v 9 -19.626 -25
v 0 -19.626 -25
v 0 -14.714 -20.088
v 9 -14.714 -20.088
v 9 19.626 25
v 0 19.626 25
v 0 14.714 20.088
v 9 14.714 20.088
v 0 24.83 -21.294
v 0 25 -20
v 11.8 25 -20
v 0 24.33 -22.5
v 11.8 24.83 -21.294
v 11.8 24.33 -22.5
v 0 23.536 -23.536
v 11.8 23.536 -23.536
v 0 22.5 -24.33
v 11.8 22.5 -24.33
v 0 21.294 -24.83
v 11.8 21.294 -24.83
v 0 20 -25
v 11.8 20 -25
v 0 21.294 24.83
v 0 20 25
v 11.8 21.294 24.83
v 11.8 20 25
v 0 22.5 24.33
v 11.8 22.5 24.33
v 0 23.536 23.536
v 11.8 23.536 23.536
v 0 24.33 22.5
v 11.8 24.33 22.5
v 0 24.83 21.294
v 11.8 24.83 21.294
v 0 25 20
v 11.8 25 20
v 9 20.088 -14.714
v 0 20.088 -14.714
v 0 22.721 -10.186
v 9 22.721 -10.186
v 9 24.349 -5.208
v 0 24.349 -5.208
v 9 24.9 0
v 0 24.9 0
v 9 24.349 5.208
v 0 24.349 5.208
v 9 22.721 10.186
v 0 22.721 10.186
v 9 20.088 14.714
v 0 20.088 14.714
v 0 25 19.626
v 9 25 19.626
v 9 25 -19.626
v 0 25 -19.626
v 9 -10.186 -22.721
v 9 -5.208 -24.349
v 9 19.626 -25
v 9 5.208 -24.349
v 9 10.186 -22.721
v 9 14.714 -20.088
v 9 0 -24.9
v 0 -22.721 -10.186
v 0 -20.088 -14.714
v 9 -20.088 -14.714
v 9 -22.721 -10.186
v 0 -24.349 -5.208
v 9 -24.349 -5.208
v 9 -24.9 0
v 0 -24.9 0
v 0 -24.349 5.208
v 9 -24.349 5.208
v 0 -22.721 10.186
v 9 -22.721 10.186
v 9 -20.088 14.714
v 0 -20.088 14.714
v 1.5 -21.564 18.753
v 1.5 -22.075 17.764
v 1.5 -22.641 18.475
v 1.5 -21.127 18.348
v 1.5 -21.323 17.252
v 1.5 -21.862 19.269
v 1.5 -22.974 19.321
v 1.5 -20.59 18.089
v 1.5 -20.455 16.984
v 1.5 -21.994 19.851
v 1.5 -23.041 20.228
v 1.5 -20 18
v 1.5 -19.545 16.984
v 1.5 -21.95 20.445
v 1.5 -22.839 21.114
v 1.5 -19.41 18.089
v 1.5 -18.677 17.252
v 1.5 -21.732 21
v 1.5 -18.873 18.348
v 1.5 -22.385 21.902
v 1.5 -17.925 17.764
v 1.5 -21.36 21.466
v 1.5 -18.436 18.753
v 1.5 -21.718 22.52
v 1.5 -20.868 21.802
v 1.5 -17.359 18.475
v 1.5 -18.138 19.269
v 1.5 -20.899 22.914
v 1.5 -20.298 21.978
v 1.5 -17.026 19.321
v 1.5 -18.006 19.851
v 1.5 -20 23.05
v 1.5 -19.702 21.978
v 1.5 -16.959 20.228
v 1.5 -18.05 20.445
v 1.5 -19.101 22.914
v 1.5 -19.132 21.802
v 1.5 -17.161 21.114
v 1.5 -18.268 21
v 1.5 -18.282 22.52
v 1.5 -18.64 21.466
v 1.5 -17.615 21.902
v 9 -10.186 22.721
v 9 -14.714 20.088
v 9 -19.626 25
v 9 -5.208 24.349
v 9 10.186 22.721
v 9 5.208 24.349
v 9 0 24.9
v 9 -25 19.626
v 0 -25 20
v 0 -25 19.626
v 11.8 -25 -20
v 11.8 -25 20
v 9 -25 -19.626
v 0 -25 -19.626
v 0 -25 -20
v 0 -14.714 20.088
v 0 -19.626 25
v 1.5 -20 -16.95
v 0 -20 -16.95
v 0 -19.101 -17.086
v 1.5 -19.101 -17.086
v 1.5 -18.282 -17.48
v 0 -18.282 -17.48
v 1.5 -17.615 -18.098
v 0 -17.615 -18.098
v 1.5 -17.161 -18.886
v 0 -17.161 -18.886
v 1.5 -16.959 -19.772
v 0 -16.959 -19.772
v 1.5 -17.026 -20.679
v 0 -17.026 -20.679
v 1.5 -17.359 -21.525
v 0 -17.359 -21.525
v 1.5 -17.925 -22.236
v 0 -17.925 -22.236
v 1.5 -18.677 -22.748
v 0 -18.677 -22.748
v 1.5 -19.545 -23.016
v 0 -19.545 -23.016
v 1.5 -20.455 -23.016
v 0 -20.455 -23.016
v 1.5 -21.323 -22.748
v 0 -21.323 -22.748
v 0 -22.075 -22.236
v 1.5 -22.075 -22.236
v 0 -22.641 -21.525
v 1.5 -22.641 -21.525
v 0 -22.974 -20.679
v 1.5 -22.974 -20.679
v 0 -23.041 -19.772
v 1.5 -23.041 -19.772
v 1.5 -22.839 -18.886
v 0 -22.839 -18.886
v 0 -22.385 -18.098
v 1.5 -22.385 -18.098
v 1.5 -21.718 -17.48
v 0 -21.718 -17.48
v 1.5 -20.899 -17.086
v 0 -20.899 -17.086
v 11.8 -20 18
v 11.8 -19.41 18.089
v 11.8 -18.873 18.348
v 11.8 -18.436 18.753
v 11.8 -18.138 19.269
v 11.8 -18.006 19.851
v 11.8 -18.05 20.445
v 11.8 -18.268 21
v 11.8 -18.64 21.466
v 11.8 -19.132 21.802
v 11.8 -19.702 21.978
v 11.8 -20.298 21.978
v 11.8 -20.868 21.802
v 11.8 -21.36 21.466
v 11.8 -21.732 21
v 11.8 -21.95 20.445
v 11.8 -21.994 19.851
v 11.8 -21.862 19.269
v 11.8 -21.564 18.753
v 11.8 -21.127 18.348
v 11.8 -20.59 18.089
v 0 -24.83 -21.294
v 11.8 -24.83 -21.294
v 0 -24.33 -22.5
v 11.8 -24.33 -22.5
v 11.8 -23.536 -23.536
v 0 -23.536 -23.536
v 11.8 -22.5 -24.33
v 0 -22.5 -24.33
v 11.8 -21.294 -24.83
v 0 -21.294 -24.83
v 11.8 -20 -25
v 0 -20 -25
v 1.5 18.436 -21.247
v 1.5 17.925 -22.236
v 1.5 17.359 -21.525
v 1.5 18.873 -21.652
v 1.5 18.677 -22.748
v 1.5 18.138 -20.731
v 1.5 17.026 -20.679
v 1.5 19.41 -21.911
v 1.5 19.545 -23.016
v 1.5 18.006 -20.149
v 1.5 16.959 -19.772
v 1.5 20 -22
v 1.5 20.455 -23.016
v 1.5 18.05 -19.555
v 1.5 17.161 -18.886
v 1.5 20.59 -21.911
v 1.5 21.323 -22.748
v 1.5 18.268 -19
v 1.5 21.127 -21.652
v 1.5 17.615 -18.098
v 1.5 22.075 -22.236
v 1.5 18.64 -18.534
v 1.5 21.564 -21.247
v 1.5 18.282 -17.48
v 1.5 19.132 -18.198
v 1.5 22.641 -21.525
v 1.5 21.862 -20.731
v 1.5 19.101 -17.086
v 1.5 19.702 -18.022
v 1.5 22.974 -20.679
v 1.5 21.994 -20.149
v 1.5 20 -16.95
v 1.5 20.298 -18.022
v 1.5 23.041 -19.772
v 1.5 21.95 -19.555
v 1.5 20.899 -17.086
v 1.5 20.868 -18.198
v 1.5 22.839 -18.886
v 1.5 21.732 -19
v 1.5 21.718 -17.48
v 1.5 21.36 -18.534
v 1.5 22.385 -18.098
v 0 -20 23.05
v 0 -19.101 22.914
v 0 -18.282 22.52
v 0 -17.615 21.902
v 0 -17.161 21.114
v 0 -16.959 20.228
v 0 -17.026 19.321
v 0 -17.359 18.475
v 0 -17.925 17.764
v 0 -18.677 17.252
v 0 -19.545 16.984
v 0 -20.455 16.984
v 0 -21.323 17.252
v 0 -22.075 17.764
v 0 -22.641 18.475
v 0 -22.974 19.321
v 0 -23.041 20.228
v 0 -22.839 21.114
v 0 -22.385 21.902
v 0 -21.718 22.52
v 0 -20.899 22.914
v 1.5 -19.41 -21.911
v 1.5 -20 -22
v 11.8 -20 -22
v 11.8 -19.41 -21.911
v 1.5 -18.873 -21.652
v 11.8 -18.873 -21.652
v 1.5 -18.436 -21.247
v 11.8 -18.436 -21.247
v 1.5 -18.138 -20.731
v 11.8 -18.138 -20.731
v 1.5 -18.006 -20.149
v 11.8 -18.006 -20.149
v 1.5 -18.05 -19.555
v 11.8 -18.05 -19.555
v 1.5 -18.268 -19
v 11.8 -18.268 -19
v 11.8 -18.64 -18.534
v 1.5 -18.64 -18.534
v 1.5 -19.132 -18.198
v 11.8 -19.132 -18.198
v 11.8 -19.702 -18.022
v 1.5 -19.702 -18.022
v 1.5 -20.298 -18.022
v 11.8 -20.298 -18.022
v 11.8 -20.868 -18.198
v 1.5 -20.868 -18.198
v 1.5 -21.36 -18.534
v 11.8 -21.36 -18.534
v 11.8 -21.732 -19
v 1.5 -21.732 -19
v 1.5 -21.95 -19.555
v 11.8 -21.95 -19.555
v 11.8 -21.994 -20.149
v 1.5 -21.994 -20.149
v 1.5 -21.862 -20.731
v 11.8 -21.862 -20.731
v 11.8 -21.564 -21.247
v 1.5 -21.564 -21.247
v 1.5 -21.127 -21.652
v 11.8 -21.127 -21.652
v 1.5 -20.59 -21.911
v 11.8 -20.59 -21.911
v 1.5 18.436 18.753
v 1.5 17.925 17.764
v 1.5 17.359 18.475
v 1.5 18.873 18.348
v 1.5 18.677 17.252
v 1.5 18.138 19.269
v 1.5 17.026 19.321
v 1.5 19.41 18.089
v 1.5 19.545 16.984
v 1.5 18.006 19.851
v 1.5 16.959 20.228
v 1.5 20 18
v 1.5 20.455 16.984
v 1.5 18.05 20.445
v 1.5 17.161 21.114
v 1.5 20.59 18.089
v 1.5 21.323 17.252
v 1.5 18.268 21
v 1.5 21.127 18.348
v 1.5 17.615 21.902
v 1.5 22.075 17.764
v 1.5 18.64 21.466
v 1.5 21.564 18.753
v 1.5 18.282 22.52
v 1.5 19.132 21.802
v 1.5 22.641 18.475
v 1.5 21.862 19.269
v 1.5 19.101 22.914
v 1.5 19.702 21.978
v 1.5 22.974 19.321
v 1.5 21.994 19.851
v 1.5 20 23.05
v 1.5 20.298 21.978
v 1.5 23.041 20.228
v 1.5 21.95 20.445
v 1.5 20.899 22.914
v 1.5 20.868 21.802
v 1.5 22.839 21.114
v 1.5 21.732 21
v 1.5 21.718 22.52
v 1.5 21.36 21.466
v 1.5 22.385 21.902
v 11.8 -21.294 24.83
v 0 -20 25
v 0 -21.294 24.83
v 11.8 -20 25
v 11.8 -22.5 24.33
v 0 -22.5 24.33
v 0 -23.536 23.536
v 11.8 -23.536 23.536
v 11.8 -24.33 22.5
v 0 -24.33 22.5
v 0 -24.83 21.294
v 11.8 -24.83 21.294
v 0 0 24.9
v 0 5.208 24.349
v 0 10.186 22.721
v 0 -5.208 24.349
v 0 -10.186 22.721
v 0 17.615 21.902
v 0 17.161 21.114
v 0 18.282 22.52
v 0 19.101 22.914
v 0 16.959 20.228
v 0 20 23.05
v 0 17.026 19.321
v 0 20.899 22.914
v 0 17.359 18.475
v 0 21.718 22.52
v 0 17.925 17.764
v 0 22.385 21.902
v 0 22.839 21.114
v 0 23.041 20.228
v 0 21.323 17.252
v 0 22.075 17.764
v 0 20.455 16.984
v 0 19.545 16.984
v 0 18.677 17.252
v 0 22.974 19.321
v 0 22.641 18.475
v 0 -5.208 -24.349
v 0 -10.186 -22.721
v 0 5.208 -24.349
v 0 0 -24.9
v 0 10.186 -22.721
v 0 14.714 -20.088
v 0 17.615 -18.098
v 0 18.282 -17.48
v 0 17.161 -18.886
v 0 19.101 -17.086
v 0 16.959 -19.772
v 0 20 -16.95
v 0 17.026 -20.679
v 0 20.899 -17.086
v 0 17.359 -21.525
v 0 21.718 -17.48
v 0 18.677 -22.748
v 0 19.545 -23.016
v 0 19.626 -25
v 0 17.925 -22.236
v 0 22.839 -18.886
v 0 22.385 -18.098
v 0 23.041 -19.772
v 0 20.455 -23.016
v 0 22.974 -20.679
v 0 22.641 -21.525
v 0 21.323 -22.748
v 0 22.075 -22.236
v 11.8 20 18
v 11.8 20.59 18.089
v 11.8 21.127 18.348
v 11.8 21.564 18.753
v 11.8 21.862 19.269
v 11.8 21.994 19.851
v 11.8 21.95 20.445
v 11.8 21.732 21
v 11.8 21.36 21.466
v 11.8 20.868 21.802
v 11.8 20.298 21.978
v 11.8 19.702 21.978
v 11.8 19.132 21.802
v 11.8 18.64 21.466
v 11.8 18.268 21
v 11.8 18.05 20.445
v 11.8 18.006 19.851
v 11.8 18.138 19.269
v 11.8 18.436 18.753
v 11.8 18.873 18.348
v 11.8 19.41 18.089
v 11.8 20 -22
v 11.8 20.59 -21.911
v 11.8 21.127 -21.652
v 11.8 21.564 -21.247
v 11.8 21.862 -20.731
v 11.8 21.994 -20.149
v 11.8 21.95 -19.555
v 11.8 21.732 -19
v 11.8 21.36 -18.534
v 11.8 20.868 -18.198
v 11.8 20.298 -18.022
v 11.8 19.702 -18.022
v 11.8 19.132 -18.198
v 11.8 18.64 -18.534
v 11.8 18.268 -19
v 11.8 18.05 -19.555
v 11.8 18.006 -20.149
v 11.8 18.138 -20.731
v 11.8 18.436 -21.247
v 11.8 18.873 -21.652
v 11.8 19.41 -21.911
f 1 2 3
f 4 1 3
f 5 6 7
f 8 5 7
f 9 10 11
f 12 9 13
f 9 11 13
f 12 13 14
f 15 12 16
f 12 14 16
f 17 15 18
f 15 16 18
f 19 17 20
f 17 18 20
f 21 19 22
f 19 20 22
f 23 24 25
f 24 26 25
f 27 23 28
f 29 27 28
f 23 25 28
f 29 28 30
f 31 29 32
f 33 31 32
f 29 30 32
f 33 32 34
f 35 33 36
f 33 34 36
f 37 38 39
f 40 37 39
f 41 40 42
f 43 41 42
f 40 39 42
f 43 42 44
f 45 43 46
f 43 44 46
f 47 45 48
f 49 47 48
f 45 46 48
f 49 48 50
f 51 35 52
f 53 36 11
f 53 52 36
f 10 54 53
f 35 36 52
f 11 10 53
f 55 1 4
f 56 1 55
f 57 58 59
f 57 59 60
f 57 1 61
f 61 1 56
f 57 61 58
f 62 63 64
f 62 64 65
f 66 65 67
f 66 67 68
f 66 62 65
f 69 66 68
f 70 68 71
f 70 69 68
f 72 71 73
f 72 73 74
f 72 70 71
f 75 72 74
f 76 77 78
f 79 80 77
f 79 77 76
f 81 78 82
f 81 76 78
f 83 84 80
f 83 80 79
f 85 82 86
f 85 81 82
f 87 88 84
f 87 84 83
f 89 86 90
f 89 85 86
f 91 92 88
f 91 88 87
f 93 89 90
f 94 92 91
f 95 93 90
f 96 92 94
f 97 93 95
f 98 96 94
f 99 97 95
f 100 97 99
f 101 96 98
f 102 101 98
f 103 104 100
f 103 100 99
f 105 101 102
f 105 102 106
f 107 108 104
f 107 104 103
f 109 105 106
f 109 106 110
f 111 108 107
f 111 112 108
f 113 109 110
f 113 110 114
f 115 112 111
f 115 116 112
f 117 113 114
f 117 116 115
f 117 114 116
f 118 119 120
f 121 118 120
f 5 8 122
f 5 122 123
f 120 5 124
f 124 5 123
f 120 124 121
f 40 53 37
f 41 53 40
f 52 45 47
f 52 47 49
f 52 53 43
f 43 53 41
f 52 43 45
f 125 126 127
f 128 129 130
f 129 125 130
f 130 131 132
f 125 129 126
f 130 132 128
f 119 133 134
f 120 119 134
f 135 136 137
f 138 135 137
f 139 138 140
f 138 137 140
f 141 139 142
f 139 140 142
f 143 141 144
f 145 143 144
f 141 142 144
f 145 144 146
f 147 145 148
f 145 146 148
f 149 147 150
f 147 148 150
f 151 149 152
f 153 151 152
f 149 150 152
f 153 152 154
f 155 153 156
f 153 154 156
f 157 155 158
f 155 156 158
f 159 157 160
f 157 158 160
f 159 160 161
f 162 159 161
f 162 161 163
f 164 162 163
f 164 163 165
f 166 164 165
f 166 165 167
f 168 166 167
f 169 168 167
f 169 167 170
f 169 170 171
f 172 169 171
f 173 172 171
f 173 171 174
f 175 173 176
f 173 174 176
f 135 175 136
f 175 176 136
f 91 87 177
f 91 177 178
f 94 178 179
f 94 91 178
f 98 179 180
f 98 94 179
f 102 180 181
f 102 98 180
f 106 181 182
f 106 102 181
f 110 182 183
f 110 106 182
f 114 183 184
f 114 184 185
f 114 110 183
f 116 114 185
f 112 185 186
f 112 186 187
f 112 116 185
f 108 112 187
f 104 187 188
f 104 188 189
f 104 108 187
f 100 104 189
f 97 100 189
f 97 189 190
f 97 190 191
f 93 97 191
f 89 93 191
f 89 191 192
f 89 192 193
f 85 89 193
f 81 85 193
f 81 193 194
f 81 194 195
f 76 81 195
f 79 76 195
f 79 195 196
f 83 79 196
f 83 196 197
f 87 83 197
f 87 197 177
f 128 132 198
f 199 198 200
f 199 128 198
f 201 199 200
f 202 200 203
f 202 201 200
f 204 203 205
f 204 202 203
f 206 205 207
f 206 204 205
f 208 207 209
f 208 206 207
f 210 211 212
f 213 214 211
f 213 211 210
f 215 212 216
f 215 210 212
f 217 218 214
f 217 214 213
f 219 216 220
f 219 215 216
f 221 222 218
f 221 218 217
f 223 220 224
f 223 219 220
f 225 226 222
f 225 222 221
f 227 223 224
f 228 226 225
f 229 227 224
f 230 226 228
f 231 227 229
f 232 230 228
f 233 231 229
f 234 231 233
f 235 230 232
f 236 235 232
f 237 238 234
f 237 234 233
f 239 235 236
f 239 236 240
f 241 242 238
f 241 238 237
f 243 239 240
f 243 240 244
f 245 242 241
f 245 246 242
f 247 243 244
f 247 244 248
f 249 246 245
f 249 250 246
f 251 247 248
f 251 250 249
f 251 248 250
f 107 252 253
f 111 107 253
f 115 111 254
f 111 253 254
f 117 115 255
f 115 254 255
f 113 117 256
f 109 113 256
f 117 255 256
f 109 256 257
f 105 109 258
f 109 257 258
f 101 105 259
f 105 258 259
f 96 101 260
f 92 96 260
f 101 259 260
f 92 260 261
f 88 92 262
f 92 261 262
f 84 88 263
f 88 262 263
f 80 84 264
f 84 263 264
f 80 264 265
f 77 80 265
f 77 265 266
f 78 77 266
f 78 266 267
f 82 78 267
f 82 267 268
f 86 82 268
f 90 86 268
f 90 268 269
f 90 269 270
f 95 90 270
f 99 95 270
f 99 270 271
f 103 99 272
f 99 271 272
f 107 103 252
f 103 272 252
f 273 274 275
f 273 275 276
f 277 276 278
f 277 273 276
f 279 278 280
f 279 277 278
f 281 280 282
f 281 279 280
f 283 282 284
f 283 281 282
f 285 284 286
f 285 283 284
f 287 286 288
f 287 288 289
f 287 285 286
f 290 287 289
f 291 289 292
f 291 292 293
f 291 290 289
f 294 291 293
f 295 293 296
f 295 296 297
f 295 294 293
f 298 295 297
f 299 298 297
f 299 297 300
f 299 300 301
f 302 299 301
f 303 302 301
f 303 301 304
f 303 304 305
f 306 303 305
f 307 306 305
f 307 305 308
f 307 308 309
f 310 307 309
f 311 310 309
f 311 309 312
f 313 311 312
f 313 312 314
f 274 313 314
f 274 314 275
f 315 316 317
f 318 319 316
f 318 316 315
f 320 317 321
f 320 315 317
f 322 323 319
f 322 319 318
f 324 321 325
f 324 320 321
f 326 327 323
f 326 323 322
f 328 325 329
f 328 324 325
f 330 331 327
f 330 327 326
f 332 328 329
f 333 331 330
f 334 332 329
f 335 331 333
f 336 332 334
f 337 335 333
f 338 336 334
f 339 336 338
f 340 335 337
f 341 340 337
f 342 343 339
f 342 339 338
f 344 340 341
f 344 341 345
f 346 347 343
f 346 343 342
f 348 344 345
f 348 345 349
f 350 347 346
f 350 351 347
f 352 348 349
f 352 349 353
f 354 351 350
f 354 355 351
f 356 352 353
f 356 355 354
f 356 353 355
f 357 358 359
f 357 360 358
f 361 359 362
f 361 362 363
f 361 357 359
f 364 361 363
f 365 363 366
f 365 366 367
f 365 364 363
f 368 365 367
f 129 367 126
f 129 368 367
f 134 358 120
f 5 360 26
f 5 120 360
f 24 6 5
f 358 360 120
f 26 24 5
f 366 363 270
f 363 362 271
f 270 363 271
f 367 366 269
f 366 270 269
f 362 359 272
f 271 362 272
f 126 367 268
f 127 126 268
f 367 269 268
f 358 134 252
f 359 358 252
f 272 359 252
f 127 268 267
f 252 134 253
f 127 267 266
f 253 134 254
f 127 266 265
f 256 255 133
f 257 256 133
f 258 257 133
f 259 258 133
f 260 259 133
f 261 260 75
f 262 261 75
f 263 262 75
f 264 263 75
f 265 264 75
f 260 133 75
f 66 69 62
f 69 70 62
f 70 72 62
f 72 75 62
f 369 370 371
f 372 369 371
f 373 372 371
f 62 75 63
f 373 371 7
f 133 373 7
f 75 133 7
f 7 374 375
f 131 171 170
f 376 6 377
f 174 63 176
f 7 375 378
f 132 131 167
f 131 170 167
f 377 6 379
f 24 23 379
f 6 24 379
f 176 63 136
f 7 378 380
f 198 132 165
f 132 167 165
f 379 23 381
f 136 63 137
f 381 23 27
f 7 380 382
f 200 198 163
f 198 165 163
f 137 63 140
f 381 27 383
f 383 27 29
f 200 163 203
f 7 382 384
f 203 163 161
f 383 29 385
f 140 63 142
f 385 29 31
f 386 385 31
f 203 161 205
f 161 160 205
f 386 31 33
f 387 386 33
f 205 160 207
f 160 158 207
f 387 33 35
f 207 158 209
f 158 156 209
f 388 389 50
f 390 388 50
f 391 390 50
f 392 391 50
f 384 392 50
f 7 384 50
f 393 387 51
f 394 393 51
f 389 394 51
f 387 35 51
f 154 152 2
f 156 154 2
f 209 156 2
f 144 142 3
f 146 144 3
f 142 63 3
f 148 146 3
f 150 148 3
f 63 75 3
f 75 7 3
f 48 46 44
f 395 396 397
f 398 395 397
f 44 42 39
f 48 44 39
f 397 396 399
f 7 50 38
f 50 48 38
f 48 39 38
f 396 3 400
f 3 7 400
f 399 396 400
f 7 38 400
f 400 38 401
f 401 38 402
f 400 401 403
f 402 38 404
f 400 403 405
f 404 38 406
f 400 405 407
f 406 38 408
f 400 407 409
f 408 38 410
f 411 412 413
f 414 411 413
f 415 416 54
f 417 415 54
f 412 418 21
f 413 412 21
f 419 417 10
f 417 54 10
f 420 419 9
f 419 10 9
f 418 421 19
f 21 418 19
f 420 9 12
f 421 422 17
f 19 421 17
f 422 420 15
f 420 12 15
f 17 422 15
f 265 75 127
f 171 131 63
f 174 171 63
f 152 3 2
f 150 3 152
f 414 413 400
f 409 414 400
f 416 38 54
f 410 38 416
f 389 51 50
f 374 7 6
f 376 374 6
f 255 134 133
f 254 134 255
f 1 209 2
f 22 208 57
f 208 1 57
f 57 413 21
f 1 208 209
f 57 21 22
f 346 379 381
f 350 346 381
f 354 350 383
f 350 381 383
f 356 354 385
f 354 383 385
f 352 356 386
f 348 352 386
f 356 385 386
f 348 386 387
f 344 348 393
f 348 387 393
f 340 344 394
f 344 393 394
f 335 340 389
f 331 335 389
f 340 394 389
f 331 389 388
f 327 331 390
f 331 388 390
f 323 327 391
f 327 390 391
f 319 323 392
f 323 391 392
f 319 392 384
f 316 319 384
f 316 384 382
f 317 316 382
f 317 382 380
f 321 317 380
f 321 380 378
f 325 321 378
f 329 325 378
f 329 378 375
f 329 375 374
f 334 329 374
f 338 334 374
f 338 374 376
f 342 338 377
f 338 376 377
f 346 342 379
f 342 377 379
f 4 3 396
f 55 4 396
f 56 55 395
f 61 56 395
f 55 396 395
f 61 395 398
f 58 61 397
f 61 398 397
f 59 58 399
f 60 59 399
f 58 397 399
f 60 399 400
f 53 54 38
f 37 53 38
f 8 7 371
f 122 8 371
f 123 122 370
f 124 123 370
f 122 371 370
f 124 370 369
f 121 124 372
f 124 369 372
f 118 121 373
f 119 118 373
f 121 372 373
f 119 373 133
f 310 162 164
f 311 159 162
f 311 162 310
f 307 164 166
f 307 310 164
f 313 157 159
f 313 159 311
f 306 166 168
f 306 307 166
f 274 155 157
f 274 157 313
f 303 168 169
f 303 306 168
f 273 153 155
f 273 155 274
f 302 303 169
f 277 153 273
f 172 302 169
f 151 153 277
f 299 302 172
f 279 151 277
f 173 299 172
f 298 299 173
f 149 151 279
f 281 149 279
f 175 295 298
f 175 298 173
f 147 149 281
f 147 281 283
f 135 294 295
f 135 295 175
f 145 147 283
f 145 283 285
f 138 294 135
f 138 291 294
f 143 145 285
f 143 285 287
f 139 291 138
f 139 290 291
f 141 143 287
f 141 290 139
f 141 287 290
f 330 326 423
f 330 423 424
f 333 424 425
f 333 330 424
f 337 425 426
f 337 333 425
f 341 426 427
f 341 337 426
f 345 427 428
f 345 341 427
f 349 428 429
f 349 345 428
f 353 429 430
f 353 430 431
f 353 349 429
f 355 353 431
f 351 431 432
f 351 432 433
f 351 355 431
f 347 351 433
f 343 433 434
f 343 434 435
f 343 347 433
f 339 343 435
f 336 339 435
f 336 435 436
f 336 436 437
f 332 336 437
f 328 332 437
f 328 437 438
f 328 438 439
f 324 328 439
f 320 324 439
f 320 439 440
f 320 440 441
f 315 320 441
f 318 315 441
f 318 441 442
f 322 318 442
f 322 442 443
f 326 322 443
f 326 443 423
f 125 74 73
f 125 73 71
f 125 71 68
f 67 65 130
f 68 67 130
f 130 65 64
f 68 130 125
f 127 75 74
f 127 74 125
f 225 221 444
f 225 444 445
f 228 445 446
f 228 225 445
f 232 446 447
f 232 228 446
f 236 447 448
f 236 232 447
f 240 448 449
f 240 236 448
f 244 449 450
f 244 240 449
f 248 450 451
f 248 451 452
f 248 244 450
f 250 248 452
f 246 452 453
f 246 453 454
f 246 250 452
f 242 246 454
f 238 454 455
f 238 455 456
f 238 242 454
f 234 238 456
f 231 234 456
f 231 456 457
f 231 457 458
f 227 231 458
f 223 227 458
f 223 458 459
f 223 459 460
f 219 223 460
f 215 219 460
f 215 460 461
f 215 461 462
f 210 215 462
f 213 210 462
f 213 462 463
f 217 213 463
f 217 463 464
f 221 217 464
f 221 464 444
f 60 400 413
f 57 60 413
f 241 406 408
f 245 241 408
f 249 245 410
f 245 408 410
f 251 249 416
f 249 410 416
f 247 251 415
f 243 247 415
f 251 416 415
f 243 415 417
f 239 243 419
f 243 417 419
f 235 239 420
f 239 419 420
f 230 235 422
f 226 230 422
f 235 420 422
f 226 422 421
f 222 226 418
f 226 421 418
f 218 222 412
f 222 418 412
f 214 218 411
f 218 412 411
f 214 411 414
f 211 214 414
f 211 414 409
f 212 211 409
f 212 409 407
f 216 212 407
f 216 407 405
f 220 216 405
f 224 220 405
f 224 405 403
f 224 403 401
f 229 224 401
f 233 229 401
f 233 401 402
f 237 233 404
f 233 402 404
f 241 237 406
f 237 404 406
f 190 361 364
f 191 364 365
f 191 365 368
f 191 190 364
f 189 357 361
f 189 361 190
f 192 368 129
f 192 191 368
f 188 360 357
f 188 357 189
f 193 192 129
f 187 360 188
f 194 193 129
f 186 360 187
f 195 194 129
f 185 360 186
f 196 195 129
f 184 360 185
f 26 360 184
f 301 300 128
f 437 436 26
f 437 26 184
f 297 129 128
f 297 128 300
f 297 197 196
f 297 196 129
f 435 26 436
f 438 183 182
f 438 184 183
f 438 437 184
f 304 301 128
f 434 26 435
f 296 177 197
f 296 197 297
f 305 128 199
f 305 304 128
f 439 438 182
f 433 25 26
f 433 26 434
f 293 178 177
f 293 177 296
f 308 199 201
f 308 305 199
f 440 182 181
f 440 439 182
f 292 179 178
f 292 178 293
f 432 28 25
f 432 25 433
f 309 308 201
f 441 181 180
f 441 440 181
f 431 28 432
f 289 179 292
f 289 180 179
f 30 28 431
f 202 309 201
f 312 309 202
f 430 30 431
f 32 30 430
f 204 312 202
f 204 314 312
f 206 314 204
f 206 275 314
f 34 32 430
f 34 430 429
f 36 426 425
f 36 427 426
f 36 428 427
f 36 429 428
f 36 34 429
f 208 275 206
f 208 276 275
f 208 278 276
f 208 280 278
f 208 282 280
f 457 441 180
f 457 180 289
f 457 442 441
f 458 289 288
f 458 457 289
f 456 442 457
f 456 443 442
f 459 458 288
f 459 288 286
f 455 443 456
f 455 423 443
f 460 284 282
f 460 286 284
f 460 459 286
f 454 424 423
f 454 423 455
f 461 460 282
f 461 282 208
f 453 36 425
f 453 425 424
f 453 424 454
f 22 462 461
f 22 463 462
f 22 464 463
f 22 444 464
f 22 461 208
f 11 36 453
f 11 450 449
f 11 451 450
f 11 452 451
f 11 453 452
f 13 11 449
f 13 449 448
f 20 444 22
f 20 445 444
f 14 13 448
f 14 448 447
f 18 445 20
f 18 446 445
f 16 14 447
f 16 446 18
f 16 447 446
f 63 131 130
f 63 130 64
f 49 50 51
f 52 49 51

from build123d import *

# Parameters (mm, degrees)
SKETCH1_W          = 50
SKETCH1_H          = 50
SKETCH1_R          = 2
BODY_DEPTH         = 11.8
FILLET1_R          = 5
SKETCH2_R          = 3.05
C_BORES_DEPTH      = 1.5
CUT_EXTRUDE1_DEPTH = 9


with BuildPart() as part:
    # Sketch1 → Body (new body)
    with BuildSketch(Plane(origin=(0, 0, 0), x_dir=(0, 0, -1), z_dir=(1, 0, 0))):
        Rectangle(SKETCH1_W, SKETCH1_H)
        with Locations((-20, -20)):
            Circle(SKETCH1_R, mode=Mode.SUBTRACT)
        with Locations((-20, 20)):
            Circle(SKETCH1_R, mode=Mode.SUBTRACT)
        with Locations((20, 20)):
            Circle(SKETCH1_R, mode=Mode.SUBTRACT)
        with Locations((20, -20)):
            Circle(SKETCH1_R, mode=Mode.SUBTRACT)
    extrude(amount=BODY_DEPTH)

    # Fillet1
    fillet1_edges = [part.edges().sort_by_distance(p)[0] for p in [
        (5.9, -25, -25),
        (5.9, -25, 25),
        (5.9, 25, 25),
        (5.9, 25, -25),
    ]]
    fillet(fillet1_edges, radius=FILLET1_R)

    # Sketch2 → C'Bores (cut)
    with BuildSketch(Plane.ZY):
        with Locations((-20, -20)):
            Circle(SKETCH2_R)
        with Locations((-20, 20)):
            Circle(SKETCH2_R)
        with Locations((20, 20)):
            Circle(SKETCH2_R)
        with Locations((20, -20)):
            Circle(SKETCH2_R)
    extrude(amount=-C_BORES_DEPTH, mode=Mode.SUBTRACT)

    # Sketch3 → Cut-Extrude1 (cut)
    with BuildSketch(Plane.ZY):
        with BuildLine():
            Line((-25, -19.625988463), (-20.087724144, -14.713712607))
            ThreePointArc((-20.087724144, -14.713712607), (-24.9, 0), (-20.087724144, 14.713712607))
            Line((-20.087724144, 14.713712607), (-25, 19.625988463))
            Line((-25, 19.625988463), (-25, -19.625988463))
        make_face()
        with BuildLine():
            Line((-19.625988463, -25), (-14.713712607, -20.087724144))
            ThreePointArc((-14.713712607, -20.087724144), (0, -24.9), (14.713712607, -20.087724144))
            Line((14.713712607, -20.087724144), (19.625988463, -25))
            Line((19.625988463, -25), (-19.625988463, -25))
        make_face()
        with BuildLine():
            Line((-19.625988463, 25), (-14.713712607, 20.087724144))
            ThreePointArc((-14.713712607, 20.087724144), (0, 24.9), (14.713712607, 20.087724144))
            Line((14.713712607, 20.087724144), (19.625988463, 25))
            Line((19.625988463, 25), (-19.625988463, 25))
        make_face()
        with BuildLine():
            Line((25, 19.625988463), (20.087724144, 14.713712607))
            ThreePointArc((20.087724144, 14.713712607), (24.9, 0), (20.087724144, -14.713712607))
            Line((20.087724144, -14.713712607), (25, -19.625988463))
            Line((25, -19.625988463), (25, 19.625988463))
        make_face()
    extrude(amount=-CUT_EXTRUDE1_DEPTH, mode=Mode.SUBTRACT)


solid = part.part
